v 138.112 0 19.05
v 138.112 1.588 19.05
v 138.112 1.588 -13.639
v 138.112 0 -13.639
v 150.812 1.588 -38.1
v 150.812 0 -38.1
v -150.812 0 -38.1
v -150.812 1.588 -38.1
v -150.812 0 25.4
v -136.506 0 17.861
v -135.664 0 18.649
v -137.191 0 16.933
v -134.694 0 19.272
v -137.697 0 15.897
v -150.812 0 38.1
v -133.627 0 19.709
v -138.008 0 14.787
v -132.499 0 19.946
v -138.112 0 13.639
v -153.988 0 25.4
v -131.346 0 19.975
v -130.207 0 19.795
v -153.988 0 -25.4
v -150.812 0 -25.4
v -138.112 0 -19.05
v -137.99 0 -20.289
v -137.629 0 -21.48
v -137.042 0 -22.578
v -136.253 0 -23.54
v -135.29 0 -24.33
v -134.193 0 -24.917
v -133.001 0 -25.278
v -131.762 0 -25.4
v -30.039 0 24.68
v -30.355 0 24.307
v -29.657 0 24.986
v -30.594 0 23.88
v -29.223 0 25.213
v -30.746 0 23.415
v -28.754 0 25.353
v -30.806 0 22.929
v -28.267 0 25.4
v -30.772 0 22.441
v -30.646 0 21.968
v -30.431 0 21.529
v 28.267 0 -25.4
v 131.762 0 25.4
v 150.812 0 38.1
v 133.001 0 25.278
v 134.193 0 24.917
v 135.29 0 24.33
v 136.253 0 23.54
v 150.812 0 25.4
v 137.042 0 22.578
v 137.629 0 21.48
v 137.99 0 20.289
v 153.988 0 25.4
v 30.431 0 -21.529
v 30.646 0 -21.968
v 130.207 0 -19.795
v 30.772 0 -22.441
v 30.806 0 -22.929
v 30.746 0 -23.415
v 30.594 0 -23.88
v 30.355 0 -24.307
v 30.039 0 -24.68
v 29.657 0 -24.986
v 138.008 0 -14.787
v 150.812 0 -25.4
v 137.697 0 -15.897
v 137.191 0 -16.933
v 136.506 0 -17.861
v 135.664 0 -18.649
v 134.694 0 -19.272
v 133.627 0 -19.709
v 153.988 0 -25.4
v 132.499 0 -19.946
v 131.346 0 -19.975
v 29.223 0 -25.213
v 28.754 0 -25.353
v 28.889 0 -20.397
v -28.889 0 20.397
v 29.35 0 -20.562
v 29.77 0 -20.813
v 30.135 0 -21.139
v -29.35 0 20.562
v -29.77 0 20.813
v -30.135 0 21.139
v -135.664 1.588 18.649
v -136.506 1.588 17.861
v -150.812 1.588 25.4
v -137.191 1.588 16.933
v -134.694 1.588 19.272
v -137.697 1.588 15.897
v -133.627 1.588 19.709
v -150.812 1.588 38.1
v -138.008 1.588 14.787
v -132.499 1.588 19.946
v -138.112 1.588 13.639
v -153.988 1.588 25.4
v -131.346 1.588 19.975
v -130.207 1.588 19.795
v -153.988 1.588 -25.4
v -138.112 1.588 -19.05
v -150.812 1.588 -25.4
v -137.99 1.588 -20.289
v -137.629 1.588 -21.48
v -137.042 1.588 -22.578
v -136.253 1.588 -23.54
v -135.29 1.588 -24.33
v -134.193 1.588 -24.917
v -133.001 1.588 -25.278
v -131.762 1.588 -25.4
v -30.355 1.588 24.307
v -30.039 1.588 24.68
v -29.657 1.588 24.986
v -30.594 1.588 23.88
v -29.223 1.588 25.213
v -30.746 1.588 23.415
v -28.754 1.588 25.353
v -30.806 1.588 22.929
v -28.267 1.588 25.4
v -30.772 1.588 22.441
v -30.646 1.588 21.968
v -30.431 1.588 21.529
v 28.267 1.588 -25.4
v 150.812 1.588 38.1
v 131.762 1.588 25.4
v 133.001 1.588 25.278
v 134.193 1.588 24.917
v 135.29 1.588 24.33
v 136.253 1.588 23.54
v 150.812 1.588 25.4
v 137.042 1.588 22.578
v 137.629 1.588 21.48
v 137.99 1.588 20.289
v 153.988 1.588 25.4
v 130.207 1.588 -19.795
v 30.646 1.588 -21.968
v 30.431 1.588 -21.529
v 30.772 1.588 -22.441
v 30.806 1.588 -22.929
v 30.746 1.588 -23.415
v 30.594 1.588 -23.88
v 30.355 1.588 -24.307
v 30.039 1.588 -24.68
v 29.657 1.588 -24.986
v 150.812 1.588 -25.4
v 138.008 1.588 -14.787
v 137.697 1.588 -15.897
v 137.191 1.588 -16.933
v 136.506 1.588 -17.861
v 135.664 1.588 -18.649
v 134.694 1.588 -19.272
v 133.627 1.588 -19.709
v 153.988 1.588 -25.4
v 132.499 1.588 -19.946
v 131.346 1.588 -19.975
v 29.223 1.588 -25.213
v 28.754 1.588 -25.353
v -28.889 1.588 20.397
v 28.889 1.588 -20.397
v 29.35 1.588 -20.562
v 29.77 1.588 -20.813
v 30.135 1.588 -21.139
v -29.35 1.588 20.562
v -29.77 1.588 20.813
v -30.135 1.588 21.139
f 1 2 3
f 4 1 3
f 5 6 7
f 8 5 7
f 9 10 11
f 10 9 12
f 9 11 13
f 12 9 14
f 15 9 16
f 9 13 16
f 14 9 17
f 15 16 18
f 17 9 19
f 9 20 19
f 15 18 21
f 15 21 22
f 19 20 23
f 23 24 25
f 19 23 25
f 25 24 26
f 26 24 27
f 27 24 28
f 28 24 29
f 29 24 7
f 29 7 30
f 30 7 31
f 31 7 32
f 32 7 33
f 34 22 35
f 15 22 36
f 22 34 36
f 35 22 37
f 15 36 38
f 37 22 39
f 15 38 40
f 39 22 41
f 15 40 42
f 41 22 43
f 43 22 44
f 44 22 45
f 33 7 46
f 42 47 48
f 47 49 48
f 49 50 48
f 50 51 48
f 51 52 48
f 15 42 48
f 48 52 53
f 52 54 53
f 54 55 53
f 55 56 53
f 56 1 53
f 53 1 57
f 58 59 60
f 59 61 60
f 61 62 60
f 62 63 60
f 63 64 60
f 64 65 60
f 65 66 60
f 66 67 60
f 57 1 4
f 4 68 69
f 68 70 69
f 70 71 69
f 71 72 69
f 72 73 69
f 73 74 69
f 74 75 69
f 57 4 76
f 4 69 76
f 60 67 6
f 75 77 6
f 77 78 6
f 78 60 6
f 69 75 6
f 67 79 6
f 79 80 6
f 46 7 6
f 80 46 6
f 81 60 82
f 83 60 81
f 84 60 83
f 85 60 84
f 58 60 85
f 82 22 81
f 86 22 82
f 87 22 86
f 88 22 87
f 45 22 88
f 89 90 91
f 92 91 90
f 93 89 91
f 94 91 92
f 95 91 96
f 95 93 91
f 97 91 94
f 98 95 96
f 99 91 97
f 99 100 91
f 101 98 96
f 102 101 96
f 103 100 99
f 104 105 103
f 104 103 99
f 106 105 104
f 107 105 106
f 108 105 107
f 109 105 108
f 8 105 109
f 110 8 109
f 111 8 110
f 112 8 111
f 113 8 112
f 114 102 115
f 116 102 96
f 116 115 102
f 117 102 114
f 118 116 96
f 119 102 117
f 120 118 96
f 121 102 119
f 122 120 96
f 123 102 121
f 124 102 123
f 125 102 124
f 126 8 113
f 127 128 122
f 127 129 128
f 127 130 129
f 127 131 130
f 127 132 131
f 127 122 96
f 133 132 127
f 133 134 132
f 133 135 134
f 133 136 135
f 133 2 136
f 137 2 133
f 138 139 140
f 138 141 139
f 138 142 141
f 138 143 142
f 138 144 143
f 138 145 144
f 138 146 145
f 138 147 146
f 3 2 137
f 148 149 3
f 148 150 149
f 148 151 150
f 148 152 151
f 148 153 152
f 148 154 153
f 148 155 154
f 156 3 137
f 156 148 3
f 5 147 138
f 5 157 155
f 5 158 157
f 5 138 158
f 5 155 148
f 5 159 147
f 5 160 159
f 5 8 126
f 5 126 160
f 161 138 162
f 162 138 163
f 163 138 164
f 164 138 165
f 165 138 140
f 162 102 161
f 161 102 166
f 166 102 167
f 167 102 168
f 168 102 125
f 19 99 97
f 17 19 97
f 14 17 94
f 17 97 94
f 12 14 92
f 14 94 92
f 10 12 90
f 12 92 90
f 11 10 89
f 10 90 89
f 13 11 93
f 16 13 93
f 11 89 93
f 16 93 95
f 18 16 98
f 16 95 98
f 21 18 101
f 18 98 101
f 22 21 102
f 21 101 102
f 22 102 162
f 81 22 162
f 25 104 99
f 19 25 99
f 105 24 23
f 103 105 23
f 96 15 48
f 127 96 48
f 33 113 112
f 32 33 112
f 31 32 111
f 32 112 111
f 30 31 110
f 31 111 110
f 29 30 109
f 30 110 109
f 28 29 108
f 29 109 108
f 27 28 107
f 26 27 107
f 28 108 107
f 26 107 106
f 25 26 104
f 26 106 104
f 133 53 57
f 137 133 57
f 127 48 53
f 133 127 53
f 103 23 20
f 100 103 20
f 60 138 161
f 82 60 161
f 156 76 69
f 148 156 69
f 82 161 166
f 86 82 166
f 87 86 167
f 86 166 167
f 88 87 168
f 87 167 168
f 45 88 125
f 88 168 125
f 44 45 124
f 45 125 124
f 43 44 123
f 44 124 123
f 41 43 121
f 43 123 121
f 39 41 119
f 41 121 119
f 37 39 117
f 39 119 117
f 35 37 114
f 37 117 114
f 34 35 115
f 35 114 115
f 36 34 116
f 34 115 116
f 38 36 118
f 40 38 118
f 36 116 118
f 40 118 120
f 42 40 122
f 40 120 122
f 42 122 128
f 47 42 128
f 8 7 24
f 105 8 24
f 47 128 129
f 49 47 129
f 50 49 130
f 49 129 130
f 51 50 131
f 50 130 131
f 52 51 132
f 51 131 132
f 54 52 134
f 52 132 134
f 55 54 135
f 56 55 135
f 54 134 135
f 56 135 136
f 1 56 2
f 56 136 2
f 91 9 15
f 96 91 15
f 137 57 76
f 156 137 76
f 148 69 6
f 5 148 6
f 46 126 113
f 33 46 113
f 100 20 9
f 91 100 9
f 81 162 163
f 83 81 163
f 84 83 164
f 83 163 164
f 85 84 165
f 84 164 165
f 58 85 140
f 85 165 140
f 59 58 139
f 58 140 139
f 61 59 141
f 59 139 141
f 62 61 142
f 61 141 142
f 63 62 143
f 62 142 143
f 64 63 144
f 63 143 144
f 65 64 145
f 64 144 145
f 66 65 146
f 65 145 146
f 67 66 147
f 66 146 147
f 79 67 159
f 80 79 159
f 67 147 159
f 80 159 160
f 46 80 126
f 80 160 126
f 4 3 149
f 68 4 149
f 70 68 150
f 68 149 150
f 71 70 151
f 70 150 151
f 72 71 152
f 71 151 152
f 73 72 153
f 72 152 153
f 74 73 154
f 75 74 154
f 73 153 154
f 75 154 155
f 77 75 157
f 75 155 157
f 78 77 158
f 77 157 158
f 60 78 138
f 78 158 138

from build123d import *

# Parameters (mm, degrees)
BOSS_EXTRUDE1_DEPTH = 1.5875
CUT_EXTRUDE1_DEPTH  = 159.638836079


with BuildPart() as part:
    # Sketch1 → Boss-Extrude1 (new body)
    with BuildSketch(Plane(origin=(0, 0, 0), x_dir=(1, 0, 0), z_dir=(0, 1, 0))):
        Polygon((-150.8125, 25.4), (-153.9875, 25.4), (-153.9875, -25.4), (-150.8125, -25.4), (-150.8125, -38.1), (150.8125, -38.1), (150.8125, -25.4), (153.9875, -25.4), (153.9875, 25.4), (150.8125, 25.4), (150.8125, 38.1), (-150.8125, 38.1), align=None)
    extrude(amount=BOSS_EXTRUDE1_DEPTH)

    # Sketch2 → Cut-Extrude1 (cut, through all)
    with BuildSketch(Plane(origin=(0, 1.5875, 0), x_dir=(1, 0, 0), z_dir=(0, 1, 0))):
        with BuildLine():
            Line((-138.1125, 19.05), (-138.1125, -13.638858994))
            ThreePointArc((-138.1125, -13.638858994), (-135.664170115, -18.648796151), (-130.207155019, -19.795432878))
            Line((-130.207155019, -19.795432878), (28.889358139, 20.397370446))
            ThreePointArc((28.889358139, 20.397370446), (30.78780332, 23.173465256), (28.267220147, 25.4))
            Line((28.267220147, 25.4), (-131.7625, 25.4))
            ThreePointArc((-131.7625, 25.4), (-136.252628061, 23.540128061), (-138.1125, 19.05))
        make_face()
        with BuildLine():
            Line((-28.267220147, -25.4), (131.7625, -25.4))
            ThreePointArc((131.7625, -25.4), (136.252628061, -23.540128061), (138.1125, -19.05))
            Line((138.1125, -19.05), (138.1125, 13.638858994))
            ThreePointArc((138.1125, 13.638858994), (135.664170115, 18.648796151), (130.207155019, 19.795432878))
            Line((130.207155019, 19.795432878), (-28.889358139, -20.397370446))
            ThreePointArc((-28.889358139, -20.397370446), (-30.78780332, -23.173465256), (-28.267220147, -25.4))
        make_face()
    extrude(amount=-CUT_EXTRUDE1_DEPTH, mode=Mode.SUBTRACT)


solid = part.part
